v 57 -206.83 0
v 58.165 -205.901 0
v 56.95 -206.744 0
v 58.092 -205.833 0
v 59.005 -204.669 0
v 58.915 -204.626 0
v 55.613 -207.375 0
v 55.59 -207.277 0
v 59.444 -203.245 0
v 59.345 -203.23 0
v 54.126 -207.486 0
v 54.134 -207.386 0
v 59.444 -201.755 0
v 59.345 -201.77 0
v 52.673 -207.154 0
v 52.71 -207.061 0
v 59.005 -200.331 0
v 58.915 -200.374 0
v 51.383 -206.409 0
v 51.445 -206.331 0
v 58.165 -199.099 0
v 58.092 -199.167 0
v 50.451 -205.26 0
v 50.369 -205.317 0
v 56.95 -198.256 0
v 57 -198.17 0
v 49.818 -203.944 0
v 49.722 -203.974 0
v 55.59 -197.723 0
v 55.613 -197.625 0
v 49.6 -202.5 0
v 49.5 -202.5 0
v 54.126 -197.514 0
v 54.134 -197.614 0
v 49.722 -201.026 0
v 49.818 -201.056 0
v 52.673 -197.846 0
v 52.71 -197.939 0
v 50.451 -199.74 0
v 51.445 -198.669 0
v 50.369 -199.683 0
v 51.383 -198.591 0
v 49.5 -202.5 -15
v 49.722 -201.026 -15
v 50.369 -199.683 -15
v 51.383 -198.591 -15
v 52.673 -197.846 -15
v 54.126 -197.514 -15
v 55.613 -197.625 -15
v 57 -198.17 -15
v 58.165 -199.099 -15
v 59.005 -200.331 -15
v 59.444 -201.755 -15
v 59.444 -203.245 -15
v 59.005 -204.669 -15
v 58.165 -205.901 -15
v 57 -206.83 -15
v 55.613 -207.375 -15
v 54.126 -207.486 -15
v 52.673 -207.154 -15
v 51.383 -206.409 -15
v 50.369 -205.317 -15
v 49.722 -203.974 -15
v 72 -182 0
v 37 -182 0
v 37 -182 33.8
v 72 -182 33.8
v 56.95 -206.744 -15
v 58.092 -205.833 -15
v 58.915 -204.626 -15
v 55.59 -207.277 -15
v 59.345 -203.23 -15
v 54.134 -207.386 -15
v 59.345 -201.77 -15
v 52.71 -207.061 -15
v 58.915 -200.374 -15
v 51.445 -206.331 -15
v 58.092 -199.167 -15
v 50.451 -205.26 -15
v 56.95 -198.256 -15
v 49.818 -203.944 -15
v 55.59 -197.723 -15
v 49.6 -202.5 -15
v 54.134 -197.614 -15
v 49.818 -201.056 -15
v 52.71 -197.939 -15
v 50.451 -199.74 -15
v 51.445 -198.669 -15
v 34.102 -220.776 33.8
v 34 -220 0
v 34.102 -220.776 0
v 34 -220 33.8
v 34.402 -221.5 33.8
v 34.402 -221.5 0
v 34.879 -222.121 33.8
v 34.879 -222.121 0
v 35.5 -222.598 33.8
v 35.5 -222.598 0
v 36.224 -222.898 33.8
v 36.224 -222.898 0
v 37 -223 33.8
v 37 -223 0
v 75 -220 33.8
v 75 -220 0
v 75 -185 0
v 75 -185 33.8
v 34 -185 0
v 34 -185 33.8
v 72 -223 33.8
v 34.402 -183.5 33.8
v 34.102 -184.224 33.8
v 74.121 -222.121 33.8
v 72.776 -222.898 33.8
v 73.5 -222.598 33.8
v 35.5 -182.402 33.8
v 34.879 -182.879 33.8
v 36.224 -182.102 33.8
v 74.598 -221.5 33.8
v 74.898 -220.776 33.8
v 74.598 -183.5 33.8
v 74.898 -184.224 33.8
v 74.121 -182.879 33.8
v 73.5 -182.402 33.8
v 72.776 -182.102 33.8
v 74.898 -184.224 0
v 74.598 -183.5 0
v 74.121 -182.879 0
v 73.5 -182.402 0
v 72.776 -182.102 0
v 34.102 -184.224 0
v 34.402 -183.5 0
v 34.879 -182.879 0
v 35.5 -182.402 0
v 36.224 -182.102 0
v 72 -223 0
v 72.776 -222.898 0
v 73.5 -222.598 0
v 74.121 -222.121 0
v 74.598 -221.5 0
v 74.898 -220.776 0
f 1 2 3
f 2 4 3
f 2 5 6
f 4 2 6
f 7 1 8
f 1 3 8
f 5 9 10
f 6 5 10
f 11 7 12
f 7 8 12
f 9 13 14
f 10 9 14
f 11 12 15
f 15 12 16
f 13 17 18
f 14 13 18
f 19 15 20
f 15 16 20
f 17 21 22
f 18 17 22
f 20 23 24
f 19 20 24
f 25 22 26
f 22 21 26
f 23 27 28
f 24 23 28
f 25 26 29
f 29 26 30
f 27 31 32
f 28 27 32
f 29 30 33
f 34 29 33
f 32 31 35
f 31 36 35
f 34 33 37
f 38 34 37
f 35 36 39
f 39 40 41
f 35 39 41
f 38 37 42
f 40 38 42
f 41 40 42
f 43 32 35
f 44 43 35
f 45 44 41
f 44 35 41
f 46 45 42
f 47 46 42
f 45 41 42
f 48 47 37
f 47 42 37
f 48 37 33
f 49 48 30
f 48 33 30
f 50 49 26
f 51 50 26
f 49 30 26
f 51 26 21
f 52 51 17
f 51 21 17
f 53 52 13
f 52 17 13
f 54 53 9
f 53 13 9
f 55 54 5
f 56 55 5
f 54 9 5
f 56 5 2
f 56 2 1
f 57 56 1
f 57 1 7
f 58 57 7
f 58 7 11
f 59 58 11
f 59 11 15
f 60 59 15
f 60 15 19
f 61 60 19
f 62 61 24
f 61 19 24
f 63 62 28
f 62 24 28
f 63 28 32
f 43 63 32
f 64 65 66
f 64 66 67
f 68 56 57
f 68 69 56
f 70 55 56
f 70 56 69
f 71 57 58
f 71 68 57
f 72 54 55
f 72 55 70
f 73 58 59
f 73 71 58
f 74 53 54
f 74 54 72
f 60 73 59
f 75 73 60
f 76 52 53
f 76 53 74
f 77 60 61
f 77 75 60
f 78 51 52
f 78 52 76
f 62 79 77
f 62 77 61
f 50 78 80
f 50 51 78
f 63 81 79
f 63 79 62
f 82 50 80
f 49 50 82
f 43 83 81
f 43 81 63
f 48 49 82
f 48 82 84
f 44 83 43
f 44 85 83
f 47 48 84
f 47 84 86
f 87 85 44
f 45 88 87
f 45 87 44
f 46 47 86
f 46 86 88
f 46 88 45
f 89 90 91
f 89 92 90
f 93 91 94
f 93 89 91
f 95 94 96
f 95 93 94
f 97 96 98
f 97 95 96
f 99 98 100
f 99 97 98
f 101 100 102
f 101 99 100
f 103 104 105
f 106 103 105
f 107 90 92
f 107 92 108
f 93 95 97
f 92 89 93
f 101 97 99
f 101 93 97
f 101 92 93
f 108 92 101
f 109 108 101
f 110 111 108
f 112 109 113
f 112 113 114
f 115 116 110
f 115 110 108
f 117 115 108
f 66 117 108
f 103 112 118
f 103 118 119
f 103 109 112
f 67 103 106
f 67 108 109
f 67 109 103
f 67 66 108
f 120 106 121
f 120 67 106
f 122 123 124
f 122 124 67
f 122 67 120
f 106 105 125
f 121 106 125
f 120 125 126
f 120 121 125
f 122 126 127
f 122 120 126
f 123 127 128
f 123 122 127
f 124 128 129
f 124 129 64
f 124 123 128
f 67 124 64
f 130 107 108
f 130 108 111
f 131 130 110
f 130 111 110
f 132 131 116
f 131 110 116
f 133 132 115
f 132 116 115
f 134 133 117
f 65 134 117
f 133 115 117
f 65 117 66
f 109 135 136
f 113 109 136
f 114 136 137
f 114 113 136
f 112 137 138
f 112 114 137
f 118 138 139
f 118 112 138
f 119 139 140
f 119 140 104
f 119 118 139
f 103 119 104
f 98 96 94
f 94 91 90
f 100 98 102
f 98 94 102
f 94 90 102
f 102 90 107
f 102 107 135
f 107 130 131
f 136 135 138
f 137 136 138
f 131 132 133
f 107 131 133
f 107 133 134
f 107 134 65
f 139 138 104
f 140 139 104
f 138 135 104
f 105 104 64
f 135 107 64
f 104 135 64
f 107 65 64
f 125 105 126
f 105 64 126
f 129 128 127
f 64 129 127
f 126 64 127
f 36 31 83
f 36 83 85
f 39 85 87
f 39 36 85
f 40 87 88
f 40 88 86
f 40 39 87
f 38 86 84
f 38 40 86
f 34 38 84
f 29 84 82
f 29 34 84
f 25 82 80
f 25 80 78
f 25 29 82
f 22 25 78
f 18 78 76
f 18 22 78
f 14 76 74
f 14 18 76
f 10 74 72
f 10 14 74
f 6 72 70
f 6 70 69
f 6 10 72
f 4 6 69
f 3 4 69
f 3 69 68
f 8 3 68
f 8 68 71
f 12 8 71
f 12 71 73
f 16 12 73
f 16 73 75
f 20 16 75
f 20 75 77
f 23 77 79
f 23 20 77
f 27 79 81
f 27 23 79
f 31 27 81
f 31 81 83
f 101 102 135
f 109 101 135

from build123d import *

# Parameters (mm, degrees)
SKETCH1_W           = 41
SKETCH1_H           = 41
BOSS_EXTRUDE1_DEPTH = 33.8
SKETCH2_R           = 5
SKETCH2_R_2         = 4.9
BOSS_EXTRUDE2_DEPTH = 15
FILLET1_R           = 3


with BuildPart() as part:
    # Sketch1 → Boss-Extrude1 (new body)
    with BuildSketch(Plane.XY):
        with Locations((54.5, -202.5)):
            Rectangle(SKETCH1_W, SKETCH1_H)
    extrude(amount=BOSS_EXTRUDE1_DEPTH)

    # Fillet1
    fillet1_edges = [part.edges().sort_by_distance(p)[0] for p in [
        (34, -223, 16.9),
        (34, -182, 16.9),
        (75, -182, 16.9),
        (75, -223, 16.9),
    ]]
    fillet(fillet1_edges, radius=FILLET1_R)


with BuildPart() as body_2:
    # Sketch2 → Boss-Extrude2 (new body)
    with BuildSketch(Plane(origin=(0, 0, 0), x_dir=(-1, 0, 0), z_dir=(0, 0, -1))):
        with Locations((-54.5, -202.5)):
            Circle(SKETCH2_R)
        with Locations((-54.5, -202.5)):
            Circle(SKETCH2_R_2, mode=Mode.SUBTRACT)
    extrude(amount=BOSS_EXTRUDE2_DEPTH)


solid = Compound([part.part, body_2.part])
